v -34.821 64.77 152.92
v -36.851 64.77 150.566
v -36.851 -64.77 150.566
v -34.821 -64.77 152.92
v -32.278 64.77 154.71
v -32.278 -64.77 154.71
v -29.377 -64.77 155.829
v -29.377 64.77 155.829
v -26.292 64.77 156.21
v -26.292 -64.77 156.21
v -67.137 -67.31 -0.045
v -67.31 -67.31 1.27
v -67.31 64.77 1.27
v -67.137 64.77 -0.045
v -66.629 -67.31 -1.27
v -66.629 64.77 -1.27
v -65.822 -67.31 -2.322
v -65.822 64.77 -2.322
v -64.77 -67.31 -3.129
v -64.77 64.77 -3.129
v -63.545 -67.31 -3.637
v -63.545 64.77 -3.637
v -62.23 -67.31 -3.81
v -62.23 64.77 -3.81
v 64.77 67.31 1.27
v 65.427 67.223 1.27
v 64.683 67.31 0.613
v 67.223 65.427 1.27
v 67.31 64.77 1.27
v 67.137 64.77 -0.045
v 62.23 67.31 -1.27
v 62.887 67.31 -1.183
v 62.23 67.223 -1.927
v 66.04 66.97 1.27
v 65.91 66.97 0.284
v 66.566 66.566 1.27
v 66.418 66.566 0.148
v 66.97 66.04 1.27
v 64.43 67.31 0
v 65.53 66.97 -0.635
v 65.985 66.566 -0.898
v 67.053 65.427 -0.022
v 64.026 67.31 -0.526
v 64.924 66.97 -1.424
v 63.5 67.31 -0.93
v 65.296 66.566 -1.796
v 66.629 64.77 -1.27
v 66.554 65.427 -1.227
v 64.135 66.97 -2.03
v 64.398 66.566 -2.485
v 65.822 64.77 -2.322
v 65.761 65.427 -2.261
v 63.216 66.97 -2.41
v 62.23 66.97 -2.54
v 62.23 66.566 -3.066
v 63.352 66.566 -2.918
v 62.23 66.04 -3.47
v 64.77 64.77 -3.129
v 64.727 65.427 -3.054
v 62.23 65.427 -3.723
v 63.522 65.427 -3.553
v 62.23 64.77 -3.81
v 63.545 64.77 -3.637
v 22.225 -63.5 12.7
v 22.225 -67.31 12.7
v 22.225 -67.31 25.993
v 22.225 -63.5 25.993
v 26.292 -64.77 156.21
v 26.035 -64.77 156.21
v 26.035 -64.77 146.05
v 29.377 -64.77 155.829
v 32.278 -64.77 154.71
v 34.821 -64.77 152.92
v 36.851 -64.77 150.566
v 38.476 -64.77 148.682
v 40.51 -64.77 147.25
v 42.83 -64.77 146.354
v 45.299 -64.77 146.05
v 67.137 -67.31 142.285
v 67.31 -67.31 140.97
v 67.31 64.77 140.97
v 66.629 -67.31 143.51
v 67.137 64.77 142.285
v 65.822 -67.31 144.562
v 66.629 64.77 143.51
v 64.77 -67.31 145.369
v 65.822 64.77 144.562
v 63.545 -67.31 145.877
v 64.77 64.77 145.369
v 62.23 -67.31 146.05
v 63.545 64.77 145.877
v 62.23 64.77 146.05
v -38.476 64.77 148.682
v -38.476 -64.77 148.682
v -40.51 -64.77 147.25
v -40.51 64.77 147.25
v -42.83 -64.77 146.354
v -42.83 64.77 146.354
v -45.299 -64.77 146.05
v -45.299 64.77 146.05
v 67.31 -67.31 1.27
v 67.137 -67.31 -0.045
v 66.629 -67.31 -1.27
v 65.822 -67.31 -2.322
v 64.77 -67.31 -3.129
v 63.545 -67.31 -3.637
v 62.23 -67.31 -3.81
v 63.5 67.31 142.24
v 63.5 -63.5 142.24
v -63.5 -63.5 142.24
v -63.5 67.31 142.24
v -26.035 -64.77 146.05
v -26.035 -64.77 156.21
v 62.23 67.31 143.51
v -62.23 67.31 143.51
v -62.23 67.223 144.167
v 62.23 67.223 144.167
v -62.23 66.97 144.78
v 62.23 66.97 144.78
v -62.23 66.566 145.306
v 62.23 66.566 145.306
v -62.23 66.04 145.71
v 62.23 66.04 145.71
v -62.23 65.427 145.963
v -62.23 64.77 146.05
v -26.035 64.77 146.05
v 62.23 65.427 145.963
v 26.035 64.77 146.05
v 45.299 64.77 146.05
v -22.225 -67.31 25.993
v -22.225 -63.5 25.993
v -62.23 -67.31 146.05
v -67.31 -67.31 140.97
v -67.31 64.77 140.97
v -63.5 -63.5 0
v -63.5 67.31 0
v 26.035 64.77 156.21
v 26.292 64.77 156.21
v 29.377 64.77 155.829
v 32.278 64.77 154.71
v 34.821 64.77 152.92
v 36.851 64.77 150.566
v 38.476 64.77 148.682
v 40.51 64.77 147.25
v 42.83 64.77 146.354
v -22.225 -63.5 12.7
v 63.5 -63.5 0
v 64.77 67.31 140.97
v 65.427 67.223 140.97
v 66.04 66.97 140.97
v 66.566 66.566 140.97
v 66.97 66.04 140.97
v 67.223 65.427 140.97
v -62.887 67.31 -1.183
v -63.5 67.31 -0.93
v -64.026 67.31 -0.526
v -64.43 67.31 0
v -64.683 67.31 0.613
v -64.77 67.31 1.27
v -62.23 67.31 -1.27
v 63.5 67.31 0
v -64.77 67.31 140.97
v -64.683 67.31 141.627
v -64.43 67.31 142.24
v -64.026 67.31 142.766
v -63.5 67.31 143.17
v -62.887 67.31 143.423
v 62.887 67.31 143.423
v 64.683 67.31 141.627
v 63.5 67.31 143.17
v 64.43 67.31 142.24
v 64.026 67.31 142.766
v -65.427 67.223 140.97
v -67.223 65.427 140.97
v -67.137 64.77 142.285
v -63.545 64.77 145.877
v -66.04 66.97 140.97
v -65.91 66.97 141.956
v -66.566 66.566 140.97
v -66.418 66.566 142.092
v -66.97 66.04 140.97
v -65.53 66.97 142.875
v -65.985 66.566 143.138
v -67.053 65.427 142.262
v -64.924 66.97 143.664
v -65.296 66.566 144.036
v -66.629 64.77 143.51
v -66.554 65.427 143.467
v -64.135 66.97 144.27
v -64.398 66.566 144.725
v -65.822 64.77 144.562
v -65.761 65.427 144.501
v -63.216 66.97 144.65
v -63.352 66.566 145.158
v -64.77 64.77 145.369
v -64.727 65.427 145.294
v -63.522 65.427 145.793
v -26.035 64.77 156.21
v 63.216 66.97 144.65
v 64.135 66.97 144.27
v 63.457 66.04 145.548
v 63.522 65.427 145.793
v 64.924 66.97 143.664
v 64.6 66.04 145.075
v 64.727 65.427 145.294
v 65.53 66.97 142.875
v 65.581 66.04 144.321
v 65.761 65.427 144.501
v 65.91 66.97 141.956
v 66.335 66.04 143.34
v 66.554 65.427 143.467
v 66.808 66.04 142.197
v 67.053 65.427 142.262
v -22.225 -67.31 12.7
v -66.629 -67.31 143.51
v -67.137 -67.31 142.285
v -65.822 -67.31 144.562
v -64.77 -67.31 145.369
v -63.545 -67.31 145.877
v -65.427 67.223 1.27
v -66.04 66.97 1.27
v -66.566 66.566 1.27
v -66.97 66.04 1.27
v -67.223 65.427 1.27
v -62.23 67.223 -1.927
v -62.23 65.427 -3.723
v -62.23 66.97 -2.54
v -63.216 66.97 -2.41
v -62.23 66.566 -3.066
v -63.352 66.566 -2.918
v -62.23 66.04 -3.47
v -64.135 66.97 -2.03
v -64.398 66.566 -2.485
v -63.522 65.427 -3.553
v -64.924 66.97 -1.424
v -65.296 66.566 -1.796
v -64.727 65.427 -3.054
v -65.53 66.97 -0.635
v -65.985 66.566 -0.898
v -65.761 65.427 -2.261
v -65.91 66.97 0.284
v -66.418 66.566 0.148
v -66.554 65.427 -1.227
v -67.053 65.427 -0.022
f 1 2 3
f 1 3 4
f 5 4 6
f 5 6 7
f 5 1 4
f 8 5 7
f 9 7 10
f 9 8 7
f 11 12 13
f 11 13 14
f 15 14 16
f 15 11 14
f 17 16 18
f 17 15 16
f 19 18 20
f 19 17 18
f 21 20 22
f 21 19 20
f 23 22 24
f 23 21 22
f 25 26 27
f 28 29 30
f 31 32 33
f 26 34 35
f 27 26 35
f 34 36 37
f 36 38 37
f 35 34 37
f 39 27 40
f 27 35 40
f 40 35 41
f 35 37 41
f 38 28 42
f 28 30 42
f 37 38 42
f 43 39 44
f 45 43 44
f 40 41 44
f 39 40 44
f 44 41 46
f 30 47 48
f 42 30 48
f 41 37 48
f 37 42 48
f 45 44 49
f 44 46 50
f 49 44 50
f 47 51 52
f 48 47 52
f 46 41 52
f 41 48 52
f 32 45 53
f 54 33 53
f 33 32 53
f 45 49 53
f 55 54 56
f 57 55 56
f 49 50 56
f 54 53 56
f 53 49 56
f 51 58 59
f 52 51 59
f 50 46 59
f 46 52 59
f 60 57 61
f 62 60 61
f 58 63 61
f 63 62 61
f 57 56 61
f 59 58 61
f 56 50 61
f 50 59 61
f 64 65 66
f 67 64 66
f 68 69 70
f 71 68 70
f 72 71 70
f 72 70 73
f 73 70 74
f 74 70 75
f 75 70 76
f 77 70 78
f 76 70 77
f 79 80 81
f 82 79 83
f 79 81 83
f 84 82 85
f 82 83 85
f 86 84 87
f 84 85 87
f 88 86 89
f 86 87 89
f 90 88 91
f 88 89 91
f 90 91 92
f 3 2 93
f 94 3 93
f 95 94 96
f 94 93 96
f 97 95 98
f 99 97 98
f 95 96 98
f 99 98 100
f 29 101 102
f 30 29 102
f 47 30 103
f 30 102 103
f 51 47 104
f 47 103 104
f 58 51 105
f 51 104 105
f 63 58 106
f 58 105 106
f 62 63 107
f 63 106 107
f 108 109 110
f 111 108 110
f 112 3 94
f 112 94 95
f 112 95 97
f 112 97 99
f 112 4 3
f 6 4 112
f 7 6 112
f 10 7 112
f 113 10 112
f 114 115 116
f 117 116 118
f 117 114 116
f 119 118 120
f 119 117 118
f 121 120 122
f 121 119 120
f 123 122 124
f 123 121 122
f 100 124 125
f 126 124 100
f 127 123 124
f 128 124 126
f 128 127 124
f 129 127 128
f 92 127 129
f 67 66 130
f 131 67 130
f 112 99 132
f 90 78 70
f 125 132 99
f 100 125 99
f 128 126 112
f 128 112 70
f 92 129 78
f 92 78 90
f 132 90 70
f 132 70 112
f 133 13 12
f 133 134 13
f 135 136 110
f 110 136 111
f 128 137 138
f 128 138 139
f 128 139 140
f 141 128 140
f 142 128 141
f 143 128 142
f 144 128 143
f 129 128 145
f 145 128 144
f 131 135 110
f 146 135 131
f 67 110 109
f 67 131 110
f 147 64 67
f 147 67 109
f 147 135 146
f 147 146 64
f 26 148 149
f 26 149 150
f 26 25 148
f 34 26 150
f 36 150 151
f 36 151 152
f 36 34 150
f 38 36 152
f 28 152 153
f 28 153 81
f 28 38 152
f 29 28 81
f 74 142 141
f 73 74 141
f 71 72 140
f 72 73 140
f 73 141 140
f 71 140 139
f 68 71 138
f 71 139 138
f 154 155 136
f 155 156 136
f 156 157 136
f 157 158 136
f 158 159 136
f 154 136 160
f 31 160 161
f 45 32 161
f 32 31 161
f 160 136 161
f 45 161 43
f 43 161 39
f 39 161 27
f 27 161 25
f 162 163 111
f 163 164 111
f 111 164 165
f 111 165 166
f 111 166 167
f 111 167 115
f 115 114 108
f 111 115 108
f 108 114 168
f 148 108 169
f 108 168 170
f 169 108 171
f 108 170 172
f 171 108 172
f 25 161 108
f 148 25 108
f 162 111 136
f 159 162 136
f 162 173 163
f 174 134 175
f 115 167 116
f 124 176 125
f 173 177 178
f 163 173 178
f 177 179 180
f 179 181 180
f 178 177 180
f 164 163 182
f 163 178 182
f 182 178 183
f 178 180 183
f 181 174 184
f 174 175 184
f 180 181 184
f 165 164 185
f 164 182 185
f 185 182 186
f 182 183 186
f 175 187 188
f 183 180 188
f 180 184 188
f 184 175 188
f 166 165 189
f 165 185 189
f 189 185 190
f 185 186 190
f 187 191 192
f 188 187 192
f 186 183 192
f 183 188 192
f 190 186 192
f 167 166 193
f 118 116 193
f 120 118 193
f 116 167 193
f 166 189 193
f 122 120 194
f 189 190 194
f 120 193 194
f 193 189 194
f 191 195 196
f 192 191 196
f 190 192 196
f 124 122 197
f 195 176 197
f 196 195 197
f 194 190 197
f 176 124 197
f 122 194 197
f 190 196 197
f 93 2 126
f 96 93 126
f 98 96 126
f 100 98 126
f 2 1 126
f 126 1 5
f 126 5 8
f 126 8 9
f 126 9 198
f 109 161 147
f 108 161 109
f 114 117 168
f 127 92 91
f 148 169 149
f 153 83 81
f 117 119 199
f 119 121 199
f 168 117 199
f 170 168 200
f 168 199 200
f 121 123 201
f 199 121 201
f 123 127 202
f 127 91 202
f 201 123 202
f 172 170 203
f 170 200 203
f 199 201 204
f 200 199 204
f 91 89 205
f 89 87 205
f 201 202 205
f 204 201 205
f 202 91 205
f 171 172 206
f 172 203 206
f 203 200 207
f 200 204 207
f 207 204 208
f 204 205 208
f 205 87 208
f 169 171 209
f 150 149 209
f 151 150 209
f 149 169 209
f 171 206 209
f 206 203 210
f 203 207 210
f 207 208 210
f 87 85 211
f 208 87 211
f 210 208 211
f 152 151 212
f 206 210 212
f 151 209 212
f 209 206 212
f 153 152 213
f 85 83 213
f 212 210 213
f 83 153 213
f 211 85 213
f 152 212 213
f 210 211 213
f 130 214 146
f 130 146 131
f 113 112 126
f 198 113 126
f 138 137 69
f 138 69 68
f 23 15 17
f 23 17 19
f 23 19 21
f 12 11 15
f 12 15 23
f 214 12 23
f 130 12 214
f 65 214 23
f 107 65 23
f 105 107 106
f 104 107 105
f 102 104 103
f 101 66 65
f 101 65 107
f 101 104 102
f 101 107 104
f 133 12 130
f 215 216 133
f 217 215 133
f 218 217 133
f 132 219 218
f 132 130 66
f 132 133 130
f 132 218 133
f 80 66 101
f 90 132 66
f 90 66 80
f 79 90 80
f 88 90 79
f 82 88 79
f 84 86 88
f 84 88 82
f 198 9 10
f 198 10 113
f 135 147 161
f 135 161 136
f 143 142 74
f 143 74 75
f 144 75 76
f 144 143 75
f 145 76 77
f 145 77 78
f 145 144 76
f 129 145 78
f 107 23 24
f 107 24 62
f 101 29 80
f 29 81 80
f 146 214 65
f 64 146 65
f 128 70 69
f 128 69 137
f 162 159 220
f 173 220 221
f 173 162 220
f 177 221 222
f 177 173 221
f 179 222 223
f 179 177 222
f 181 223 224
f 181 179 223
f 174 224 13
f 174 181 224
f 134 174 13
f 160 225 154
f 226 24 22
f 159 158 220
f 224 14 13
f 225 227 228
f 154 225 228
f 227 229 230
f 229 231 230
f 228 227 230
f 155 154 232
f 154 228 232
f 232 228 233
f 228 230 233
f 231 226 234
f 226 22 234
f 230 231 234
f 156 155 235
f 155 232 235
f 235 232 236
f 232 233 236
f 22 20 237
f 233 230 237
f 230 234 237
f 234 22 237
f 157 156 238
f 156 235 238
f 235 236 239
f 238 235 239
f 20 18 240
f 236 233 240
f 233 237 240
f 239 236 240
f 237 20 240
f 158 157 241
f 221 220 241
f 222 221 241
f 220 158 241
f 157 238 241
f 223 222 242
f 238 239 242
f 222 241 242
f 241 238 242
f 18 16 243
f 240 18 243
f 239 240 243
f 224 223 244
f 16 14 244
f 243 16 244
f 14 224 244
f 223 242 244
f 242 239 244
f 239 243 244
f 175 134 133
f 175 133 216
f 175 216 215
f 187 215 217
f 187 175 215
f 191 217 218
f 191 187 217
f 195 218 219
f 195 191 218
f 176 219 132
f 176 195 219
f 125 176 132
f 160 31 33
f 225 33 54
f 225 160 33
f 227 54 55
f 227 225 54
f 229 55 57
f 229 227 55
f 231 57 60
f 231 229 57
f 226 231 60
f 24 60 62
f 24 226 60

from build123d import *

# Parameters (mm, degrees)
F0_W         = 134.62
F0_H         = 134.62
F0_W_2       = 127
F0_H_2       = 127
F1_DEPTH     = 140.97
F2_W         = 134.62
F2_H         = 134.62
F3_DEPTH     = 5.08
F4_W         = 22.225
F4_H         = 13.2926666667
F5_DEPTH     = 3.81
F6_W         = 134.62
F6_H         = 134.62
F7_DEPTH     = 3.81
F8_W         = 127
F8_H         = 142.24
F9_DEPTH     = 3.81
F10_W        = 127
F10_H        = 1.27
F11_DEPTH    = 127
F12_R        = 5.08
F13_R        = 2.54
F14_W        = 12.7
F14_H        = 129.54
F15_DEPTH    = 10.16
F16_T1_DEPTH = 191.7570394667
F17_T1_DEPTH = 129.54


# Not quite as in the source:
# - a fillet or chamfer that OpenCascade refuses, or shapes differently, is made with other operations: its cross-section is extruded or revolved along the edge and cut away or added


with BuildPart() as f1:
    # F0 (on Top) → F1 (new body)
    with BuildSketch(Plane.XY):
        Rectangle(F0_W, F0_H)
        Rectangle(F0_W_2, F0_H_2, mode=Mode.SUBTRACT)
    extrude(amount=F1_DEPTH)

    # F2 (on face) → F3 (join)
    with BuildSketch(Plane.XY.offset(140.97)):
        Rectangle(F2_W, F2_H)
    extrude(amount=F3_DEPTH)

    # F4 (on face) → F5 (cut, through all)
    with BuildSketch(Plane.XZ.offset(67.31)):
        with Locations((11.1125, 19.3463333333)):
            Rectangle(F4_W, F4_H)
        with Locations((-11.1125, 19.3463333333)):
            Rectangle(F4_W, F4_H)
    extrude(amount=-F5_DEPTH, mode=Mode.SUBTRACT)

    # F6 (on face) → F7 (join)
    with BuildSketch(Plane(origin=(0, 0, 0), x_dir=(1, 0, 0), z_dir=(0, 0, -1))):
        Rectangle(F6_W, F6_H)
    extrude(amount=F7_DEPTH)

    # F8 (on face) → F9 (cut)
    with BuildSketch(Plane(origin=(0, 67.31, 0), x_dir=(-1, 0, 0), z_dir=(0, 1, 0))):
        with Locations((0, 71.12)):
            Rectangle(F8_W, F8_H)
    extrude(amount=-F9_DEPTH, mode=Mode.SUBTRACT)

    # F10 (on face) → F11 (cut, through all)
    with BuildSketch(Plane(origin=(0, 63.5, 0), x_dir=(-1, 0, 0), z_dir=(0, 1, 0))):
        with Locations((0, 141.605)):
            Rectangle(F10_W, F10_H)
    extrude(amount=-F11_DEPTH, mode=Mode.SUBTRACT)

    # F12
    f12_edges = [f1.edges().sort_by_distance(p)[0] for p in [
        (-67.31, 0, -3.81),
        (67.31, 0, -3.81),
        (67.31, 0, 146.05),
        (-67.31, 0, 146.05),
    ]]
    fillet(f12_edges, radius=F12_R)

    # F13
    f13_edges = [f1.edges().sort_by_distance(p)[0] for p in [
        (67.31, 67.31, 71.12),
        (0, 67.31, -3.81),
        (0, 67.31, 146.05),
        (-67.31, 67.31, 71.12),
        (65.822102, 67.31, 144.562102),
        (65.822102, 67.31, -2.322102),
        (-65.822102, 67.31, 144.562102),
        (-65.822102, 67.31, -2.322102),
    ]]
    fillet(f13_edges, radius=F13_R)

    # F14 (on face) → F15 (join)
    with BuildSketch(Plane.XY.offset(146.05)):
        with Locations((-32.385, 0)):
            Rectangle(F14_W, F14_H)
        with Locations((32.385, 0)):
            Rectangle(F14_W, F14_H)
    extrude(amount=F15_DEPTH)

    # F16: fillet of radius 12.7 on 2 edges, made by hand

    # F16_s2 → F16_t1 (cut)
    with BuildSketch(Plane.XZ.offset(-95.8785197333)):
        with BuildLine():
            ThreePointArc((-38.735, 146.05), (-34.3237773635, 153.3473776994), (-26.2915921067, 156.21))
            Line((-26.2915921067, 156.21), (-38.735, 156.21))
            Line((-38.735, 156.21), (-38.735, 146.05))
        make_face()
        with BuildLine():
            ThreePointArc((38.735, 146.05), (34.3237773635, 153.3473776994), (26.2915921067, 156.21))
            Line((26.2915921067, 156.21), (38.735, 156.21))
            Line((38.735, 156.21), (38.735, 146.05))
        make_face()
    extrude(amount=F16_T1_DEPTH, mode=Mode.SUBTRACT)

    # F17: fillet of radius 10.16 on 2 edges, made by hand

    # F17_s2 → F17_t1 (join)
    with BuildSketch(Plane.XZ.offset(-64.77)):
        with BuildLine():
            ThreePointArc((-36.8513807316, 150.5655555556), (-40.5097417003, 147.2497222265), (-45.2992116315, 146.05))
            Line((-45.2992116315, 146.05), (-38.735, 146.05))
            ThreePointArc((-38.735, 146.05), (-38.0126979849, 148.3993432066), (-36.8513807316, 150.5655555556))
        make_face()
        with BuildLine():
            ThreePointArc((36.8513807316, 150.5655555556), (40.5097417003, 147.2497222265), (45.2992116315, 146.05))
            Line((45.2992116315, 146.05), (38.735, 146.05))
            ThreePointArc((38.735, 146.05), (38.0126979849, 148.3993432066), (36.8513807316, 150.5655555556))
        make_face()
    extrude(amount=F17_T1_DEPTH)


solid = f1.part
